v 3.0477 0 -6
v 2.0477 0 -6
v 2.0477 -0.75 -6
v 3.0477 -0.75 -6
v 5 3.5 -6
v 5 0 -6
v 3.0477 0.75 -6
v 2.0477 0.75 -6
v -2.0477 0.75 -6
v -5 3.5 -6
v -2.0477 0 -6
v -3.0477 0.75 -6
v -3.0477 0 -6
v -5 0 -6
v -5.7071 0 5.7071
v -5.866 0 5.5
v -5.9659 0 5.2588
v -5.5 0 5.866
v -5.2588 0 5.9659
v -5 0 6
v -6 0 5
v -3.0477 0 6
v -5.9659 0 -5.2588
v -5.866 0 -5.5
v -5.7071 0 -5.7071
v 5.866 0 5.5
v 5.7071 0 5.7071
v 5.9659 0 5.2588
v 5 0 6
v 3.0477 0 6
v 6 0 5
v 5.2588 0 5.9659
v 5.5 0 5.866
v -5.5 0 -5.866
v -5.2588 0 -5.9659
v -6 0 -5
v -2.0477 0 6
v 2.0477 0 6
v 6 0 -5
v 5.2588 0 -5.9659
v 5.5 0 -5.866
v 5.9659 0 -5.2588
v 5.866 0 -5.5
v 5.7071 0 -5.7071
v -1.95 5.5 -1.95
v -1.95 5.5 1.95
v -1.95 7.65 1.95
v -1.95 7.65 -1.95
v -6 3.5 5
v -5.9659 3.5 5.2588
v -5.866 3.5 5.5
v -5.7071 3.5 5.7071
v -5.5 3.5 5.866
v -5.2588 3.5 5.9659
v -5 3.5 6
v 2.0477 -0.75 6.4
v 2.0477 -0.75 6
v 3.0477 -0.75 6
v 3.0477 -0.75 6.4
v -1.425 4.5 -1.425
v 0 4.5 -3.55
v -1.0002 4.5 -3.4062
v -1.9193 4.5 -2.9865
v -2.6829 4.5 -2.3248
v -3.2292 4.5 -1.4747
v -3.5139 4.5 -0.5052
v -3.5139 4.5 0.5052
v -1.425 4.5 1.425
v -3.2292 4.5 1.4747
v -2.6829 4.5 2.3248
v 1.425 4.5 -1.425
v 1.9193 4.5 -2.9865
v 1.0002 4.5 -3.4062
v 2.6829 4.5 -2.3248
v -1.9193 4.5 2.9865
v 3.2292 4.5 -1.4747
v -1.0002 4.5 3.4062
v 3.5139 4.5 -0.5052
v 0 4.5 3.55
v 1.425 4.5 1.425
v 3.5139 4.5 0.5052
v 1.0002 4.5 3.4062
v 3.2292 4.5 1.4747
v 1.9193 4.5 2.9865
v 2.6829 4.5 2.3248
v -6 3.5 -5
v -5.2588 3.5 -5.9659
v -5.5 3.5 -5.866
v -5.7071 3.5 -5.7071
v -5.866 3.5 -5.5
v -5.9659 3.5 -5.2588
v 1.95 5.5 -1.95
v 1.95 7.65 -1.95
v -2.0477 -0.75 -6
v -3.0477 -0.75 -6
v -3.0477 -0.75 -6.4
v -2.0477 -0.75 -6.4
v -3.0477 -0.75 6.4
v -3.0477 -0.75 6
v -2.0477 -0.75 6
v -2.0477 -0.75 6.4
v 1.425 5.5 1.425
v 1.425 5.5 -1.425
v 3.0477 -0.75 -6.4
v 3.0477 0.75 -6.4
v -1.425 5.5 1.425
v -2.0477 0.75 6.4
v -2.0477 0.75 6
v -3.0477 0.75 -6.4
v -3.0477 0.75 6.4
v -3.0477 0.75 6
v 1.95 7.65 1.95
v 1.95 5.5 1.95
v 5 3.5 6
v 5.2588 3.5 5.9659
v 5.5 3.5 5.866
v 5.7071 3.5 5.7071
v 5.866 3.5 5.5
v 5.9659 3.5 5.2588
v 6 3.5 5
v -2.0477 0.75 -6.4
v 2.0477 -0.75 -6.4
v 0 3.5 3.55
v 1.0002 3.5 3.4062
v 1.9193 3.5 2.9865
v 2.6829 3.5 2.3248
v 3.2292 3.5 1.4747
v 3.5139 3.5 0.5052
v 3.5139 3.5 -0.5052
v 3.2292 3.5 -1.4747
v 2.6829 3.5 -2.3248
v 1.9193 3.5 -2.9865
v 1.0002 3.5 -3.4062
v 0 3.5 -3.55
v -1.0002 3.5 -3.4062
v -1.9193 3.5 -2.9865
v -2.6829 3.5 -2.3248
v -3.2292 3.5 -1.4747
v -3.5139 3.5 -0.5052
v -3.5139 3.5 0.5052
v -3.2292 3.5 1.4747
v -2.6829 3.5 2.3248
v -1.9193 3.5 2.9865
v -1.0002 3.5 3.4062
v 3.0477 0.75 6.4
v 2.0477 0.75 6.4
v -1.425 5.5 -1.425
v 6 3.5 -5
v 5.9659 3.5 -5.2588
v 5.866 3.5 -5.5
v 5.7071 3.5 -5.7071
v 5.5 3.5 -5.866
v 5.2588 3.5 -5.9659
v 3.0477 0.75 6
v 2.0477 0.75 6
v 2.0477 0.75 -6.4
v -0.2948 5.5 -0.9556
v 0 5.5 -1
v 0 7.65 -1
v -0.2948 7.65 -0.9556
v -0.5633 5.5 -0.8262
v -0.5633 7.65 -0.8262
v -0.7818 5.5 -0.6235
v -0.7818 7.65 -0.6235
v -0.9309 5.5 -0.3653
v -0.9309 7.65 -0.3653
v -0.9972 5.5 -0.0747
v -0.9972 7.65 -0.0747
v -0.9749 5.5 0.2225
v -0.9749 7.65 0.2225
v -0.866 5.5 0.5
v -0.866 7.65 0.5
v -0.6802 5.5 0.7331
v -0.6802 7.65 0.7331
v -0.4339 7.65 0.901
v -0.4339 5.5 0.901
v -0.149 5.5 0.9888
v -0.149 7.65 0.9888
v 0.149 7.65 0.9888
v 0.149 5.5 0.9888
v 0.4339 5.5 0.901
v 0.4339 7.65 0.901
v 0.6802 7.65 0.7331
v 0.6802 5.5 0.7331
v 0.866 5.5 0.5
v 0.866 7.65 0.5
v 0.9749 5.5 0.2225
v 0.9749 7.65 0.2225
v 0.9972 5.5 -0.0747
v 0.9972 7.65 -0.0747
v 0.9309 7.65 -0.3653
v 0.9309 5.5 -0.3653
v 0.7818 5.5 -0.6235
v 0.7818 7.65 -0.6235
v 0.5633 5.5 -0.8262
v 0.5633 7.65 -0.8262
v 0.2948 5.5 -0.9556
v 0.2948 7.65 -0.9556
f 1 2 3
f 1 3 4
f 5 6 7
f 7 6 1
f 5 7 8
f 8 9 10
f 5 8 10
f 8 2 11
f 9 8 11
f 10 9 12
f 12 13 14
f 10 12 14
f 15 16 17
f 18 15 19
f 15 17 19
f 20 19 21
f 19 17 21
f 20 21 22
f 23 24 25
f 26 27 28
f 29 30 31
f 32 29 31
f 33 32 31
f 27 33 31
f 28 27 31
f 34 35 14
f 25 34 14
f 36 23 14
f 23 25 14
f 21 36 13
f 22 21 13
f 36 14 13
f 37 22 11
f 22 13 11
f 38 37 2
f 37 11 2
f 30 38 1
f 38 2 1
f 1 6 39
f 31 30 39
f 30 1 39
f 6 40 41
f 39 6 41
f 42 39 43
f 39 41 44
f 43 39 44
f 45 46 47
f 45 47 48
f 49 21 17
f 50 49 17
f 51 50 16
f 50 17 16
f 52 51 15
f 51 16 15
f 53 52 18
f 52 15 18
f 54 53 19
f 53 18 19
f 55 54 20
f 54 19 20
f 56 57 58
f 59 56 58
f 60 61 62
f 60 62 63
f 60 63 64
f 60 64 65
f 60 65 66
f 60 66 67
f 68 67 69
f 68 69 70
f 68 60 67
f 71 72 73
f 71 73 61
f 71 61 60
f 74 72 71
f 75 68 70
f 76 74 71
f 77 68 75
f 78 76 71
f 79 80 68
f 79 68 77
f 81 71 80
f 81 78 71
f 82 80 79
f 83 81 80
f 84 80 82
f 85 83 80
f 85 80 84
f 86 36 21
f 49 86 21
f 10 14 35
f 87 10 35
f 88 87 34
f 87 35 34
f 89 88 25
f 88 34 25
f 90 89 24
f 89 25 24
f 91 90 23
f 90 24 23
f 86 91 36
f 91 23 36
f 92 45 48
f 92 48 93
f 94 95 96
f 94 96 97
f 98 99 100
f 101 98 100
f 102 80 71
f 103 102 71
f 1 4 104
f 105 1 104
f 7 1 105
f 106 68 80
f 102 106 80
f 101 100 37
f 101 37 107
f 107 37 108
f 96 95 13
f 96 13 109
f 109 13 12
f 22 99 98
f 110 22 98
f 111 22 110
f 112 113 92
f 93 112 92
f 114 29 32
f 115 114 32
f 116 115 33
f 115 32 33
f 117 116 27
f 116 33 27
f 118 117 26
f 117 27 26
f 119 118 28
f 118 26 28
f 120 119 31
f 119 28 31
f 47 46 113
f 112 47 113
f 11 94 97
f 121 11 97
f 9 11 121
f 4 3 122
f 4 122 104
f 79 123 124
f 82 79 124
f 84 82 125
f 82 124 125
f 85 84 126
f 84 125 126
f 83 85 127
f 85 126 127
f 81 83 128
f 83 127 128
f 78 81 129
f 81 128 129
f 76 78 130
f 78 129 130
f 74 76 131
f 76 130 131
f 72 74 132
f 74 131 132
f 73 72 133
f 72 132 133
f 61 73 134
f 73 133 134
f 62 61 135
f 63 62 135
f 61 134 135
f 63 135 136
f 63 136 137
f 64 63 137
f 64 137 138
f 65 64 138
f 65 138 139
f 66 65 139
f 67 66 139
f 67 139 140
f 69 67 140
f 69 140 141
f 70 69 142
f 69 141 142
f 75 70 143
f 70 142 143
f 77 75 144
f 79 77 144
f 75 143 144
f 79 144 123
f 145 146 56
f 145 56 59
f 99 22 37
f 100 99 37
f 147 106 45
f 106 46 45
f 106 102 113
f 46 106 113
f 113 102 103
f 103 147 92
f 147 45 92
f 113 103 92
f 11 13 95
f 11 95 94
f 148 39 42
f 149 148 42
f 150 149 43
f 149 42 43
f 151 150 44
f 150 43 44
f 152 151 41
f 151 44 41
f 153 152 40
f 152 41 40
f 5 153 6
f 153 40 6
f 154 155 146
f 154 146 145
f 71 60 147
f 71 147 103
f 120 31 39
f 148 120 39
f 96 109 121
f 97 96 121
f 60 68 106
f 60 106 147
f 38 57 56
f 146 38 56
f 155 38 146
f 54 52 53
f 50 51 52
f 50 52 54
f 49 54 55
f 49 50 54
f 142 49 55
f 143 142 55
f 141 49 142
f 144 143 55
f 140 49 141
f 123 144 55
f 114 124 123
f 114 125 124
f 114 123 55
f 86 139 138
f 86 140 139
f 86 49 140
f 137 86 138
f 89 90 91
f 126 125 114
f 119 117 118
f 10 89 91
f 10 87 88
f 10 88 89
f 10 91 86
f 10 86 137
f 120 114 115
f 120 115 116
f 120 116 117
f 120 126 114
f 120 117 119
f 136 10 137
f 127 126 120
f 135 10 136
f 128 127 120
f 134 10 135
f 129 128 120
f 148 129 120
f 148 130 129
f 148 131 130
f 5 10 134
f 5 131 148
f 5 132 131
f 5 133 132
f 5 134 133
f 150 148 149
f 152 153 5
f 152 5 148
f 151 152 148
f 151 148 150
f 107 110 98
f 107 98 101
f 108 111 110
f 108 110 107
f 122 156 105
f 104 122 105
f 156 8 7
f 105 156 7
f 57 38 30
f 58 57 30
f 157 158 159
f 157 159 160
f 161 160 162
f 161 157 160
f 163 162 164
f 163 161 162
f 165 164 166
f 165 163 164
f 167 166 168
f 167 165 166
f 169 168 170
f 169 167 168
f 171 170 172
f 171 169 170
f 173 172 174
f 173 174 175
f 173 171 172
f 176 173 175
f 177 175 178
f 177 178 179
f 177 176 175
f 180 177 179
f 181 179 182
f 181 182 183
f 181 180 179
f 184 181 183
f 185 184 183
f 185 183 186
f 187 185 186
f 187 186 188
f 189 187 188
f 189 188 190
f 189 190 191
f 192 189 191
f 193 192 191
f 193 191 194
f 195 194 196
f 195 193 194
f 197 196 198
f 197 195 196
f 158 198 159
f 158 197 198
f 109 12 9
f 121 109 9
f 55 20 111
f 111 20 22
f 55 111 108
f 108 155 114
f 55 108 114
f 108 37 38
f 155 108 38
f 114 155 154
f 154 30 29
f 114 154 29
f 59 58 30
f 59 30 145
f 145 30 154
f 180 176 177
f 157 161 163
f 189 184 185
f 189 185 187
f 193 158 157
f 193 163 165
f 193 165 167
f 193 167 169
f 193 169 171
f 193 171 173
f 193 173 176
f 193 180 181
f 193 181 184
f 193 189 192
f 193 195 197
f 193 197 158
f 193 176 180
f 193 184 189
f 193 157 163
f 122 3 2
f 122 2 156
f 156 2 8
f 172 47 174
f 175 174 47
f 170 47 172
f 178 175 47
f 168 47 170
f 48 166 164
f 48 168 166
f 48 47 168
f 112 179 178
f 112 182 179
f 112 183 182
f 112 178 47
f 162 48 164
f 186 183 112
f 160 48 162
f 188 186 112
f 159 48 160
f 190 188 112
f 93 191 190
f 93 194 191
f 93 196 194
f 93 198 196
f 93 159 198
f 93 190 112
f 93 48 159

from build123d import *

# Parameters (mm, degrees)
BOSS_EXTRUDE1_DEPTH = 3.5
SKETCH2_R           = 3.55
BOSS_EXTRUDE2_DEPTH = 1
SKETCH3_W           = 2.85
SKETCH3_H           = 2.85
BOSS_EXTRUDE3_DEPTH = 1
SKETCH4_W           = 3.9
SKETCH4_H           = 3.9
SKETCH4_R           = 1
BOSS_EXTRUDE4_DEPTH = 2.15
SKETCH5_W           = 1
SKETCH5_H           = 1.5
BOSS_EXTRUDE5_DEPTH = 0.4


with BuildPart() as part:
    # Sketch1 → Boss-Extrude1 (new body)
    with BuildSketch(Plane(origin=(0, 0, 0), x_dir=(1, 0, 0), z_dir=(0, 1, 0))):
        with BuildLine():
            Line((-5, -6), (5, -6))
            ThreePointArc((5, -6), (5.707106781, -5.707106781), (6, -5))
            Line((6, -5), (6, 5))
            ThreePointArc((6, 5), (5.707106781, 5.707106781), (5, 6))
            Line((5, 6), (-5, 6))
            ThreePointArc((-5, 6), (-5.707106781, 5.707106781), (-6, 5))
            Line((-6, 5), (-6, -5))
            ThreePointArc((-6, -5), (-5.707106781, -5.707106781), (-5, -6))
        make_face()
    extrude(amount=BOSS_EXTRUDE1_DEPTH)

    # Sketch2 → Boss-Extrude2 (add)
    with BuildSketch(Plane(origin=(0, 3.5, 0), x_dir=(1, 0, 0), z_dir=(0, 1, 0))):
        with Locations(Location((0, 0, 0), (0, 0, 270))):
            Circle(SKETCH2_R)
    extrude(amount=BOSS_EXTRUDE2_DEPTH)

    # Sketch3 → Boss-Extrude3 (add)
    with BuildSketch(Plane(origin=(0, 4.5, 0), x_dir=(1, 0, 0), z_dir=(0, 1, 0))):
        Rectangle(SKETCH3_W, SKETCH3_H)
    extrude(amount=BOSS_EXTRUDE3_DEPTH)

    # Sketch4 → Boss-Extrude4 (add)
    with BuildSketch(Plane(origin=(0, 5.5, 0), x_dir=(1, 0, 0), z_dir=(0, 1, 0))):
        Rectangle(SKETCH4_W, SKETCH4_H)
        with Locations(Location((0, 0, 0), (0, 0, 90))):
            Circle(SKETCH4_R, mode=Mode.SUBTRACT)
    extrude(amount=BOSS_EXTRUDE4_DEPTH)

    # Sketch5 → Boss-Extrude5 (add)
    with BuildSketch(Plane.XY.offset(6)):
        with Locations((-2.547676789, 0)):
            Rectangle(SKETCH5_W, SKETCH5_H)
        with Locations((2.547676789, 0)):
            Rectangle(SKETCH5_W, SKETCH5_H)
    boss_extrude5 = extrude(amount=BOSS_EXTRUDE5_DEPTH)

    # Mirror1: Boss-Extrude5 across plane
    add(boss_extrude5.mirror(Plane.XY))


solid = part.part
